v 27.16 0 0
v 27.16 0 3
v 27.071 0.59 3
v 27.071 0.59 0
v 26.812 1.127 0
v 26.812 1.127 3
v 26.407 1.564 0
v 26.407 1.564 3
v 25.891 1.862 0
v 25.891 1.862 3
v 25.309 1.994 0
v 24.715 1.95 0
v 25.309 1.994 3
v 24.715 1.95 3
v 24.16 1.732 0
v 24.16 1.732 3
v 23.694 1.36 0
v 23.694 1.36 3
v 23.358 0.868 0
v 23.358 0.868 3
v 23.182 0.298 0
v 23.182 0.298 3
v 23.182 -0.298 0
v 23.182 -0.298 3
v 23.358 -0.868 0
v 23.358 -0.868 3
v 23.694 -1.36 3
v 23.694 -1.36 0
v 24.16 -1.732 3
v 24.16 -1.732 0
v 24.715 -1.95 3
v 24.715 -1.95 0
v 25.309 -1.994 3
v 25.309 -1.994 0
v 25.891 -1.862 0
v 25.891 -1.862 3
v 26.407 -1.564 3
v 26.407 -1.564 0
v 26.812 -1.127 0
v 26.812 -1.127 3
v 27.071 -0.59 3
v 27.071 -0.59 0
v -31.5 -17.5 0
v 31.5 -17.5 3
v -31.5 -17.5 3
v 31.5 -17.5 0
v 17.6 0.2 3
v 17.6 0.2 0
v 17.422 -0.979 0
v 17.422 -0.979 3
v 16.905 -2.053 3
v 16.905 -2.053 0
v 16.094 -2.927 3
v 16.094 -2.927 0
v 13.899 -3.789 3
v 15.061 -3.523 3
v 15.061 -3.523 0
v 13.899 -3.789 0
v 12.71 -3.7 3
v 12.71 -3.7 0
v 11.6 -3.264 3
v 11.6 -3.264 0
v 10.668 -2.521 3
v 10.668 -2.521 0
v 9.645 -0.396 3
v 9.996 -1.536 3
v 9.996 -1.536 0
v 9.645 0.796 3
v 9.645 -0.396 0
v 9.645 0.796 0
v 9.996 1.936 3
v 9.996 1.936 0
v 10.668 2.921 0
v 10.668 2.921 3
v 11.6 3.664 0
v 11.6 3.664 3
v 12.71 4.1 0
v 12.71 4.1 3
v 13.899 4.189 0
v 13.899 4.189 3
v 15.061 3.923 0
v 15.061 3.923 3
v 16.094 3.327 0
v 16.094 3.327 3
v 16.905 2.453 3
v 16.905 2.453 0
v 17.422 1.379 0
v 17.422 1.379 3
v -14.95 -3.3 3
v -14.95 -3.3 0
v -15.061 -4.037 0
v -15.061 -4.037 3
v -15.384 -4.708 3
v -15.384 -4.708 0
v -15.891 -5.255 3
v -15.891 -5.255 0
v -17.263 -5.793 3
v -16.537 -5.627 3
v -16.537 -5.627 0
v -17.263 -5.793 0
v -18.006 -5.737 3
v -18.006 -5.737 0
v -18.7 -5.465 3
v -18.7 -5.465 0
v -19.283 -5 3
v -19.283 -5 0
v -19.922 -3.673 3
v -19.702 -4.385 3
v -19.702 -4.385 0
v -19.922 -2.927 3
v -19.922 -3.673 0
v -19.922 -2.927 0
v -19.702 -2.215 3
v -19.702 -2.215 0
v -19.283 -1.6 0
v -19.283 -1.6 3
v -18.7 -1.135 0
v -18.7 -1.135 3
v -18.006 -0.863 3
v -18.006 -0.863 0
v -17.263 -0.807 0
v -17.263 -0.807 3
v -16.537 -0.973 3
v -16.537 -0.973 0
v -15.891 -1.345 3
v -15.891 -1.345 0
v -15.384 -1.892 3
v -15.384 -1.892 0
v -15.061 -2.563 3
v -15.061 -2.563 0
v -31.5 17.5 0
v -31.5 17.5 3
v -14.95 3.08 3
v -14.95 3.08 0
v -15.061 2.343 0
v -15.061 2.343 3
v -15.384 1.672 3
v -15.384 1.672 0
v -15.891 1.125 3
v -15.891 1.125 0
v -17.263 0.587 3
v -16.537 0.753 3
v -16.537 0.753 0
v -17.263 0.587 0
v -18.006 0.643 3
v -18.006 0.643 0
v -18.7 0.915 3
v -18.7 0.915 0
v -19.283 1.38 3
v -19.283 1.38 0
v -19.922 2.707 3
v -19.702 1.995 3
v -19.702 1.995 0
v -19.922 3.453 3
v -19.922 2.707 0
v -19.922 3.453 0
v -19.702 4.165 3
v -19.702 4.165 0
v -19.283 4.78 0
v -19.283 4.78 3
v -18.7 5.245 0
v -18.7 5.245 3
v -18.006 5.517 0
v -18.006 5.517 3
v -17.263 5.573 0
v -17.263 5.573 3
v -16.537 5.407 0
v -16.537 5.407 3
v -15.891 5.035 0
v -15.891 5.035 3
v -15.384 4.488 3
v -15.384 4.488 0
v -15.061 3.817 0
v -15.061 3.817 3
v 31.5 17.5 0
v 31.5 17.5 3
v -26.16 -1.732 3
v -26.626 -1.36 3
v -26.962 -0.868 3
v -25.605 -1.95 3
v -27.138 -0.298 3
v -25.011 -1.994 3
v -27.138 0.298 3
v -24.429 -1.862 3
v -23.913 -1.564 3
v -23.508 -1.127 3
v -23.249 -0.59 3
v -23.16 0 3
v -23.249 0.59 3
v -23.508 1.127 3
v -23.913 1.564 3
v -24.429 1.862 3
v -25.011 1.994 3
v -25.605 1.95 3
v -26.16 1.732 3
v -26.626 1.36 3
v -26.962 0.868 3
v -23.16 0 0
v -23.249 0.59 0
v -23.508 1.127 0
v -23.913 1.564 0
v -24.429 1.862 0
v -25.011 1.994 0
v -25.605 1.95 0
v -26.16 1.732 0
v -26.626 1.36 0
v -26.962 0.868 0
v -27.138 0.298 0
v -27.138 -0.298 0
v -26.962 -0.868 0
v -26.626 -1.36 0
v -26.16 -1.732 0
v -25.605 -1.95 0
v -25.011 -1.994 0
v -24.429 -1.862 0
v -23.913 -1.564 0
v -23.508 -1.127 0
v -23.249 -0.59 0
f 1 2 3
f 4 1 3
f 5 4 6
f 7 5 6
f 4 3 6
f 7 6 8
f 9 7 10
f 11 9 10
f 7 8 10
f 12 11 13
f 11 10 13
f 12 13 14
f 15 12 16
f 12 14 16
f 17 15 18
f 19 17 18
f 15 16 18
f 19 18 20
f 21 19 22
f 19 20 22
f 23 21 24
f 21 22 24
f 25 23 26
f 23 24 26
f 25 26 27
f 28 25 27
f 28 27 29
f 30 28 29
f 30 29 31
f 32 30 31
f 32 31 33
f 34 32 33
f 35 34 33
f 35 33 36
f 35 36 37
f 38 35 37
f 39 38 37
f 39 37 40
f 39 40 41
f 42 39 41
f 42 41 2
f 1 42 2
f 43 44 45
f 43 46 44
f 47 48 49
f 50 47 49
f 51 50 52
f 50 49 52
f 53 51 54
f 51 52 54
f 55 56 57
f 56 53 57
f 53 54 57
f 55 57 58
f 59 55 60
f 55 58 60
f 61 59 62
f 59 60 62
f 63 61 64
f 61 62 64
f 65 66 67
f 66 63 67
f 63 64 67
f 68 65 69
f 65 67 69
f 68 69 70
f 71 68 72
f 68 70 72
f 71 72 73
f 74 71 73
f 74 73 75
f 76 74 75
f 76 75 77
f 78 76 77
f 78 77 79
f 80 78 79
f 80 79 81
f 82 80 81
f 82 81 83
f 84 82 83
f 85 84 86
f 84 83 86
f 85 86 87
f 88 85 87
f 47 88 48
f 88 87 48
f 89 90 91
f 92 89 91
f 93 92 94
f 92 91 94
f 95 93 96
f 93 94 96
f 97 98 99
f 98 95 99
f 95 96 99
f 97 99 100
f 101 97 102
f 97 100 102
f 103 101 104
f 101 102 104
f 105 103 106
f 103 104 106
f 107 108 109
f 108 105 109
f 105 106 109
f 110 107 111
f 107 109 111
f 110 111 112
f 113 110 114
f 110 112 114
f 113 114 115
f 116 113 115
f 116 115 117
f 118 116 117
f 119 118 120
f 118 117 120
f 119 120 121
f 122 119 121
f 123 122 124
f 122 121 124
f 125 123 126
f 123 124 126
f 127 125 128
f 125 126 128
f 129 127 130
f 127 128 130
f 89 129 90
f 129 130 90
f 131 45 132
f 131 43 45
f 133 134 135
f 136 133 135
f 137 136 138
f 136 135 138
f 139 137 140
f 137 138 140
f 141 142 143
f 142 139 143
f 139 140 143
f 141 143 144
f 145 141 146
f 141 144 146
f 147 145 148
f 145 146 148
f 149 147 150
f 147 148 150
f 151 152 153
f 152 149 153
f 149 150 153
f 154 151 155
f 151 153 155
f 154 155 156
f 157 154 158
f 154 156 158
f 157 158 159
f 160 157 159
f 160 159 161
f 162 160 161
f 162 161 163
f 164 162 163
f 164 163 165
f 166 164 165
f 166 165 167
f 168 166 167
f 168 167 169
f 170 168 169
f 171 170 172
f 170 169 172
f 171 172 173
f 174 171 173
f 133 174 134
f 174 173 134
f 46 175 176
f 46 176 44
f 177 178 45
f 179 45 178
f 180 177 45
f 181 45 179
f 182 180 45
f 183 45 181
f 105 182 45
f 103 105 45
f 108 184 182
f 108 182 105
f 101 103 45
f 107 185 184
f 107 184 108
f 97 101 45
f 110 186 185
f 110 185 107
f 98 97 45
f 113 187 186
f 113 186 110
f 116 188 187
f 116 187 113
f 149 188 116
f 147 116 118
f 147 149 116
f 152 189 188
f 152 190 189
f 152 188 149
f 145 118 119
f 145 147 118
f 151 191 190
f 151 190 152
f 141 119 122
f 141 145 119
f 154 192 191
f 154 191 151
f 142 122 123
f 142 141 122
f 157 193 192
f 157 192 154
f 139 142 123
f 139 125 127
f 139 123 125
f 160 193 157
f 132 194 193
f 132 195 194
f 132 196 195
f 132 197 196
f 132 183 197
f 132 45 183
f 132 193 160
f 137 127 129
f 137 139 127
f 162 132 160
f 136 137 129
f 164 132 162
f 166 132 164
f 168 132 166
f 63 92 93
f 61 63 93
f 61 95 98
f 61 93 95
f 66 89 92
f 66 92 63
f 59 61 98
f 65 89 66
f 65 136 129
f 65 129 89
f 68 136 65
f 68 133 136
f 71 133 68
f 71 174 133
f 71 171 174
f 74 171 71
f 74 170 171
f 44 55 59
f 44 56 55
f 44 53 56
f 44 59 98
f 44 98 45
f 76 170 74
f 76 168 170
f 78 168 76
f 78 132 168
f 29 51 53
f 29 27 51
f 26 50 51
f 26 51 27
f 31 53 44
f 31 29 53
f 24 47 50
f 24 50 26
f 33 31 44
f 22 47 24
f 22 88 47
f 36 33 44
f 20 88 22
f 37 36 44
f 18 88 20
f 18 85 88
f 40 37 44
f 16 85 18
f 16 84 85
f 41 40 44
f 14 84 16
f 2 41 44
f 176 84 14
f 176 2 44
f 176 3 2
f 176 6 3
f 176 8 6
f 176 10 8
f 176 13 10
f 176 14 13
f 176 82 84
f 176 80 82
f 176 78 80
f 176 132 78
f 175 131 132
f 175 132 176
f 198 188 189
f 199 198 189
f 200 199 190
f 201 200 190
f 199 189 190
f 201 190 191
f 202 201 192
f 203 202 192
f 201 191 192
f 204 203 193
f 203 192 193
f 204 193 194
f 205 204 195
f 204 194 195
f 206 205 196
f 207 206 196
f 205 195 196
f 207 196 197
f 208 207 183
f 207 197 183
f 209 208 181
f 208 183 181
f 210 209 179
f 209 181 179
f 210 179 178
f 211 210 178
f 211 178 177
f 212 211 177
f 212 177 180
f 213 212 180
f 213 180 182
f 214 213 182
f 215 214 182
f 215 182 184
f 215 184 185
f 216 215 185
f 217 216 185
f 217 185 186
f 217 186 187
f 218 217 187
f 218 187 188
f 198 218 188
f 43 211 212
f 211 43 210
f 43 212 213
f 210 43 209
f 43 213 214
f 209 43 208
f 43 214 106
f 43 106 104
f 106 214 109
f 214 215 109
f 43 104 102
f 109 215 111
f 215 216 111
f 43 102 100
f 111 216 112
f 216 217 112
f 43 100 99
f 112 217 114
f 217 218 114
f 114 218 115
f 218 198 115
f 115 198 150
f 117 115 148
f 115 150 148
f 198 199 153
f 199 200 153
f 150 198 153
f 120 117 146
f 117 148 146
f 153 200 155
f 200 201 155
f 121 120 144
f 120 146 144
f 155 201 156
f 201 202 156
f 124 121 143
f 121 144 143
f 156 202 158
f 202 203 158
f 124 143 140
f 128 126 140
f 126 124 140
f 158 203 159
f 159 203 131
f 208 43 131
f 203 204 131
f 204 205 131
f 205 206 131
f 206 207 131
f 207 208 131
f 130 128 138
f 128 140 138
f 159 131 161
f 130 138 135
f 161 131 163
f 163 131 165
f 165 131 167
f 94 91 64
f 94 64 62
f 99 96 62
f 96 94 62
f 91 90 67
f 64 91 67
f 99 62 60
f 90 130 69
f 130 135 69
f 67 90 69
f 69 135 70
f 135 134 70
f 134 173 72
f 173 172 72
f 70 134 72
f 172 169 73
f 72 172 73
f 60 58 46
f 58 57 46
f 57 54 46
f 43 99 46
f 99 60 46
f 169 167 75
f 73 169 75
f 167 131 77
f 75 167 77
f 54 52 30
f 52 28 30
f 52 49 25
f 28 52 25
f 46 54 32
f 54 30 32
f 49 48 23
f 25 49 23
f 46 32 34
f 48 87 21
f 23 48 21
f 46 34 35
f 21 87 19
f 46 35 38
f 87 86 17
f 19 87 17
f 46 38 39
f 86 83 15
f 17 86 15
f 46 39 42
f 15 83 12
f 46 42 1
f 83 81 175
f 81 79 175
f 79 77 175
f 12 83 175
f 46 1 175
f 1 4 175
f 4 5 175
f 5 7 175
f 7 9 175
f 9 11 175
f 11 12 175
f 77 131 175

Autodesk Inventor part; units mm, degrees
ref_plane "YZ Plane" through (0, 0, 0) normal (1, 0, 0) x (0, 1, 0)
ref_plane "XZ Plane" through (0, 0, 0) normal (0, 1, 0) x (-1, 0, 0)
ref_plane "XY Plane" through (0, 0, 0) normal (0, 0, 1) x (1, 0, 0)
sketch "Sketch1" plane through (0, 0, 0) normal (0, 0, 1) x (1, 0, 0)
  line L0 (-31.5, 17.5) -> (31.5, 17.5)
  line L1 (31.5, 17.5) -> (31.5, -17.5)
  line L2 (31.5, -17.5) -> (-31.5, -17.5)
  line L3 (-31.5, -17.5) -> (-31.5, 17.5)
  line L4 (-31.5, 17.5) -> (31.5, -17.5) construction
  line L5 (31.5, 17.5) -> (-31.5, -17.5) construction
  circle A0 centre (13.6, 0.2) radius 4
  circle A1 centre (-17.45, 3.08) radius 2.5
  circle A2 centre (-17.45, -3.3) radius 2.5
  point P0 (0, 0)
  dimension "d0" = 63
  dimension "d1" = 35
  dimension "d2" = 8
  dimension "d3" = 17.9
  dimension "d4" = 17.7
  dimension "d5" = 5
  dimension "d6" = 5
  dimension "d7" = 14.2
  dimension "d8" = 48.95
  dimension "d9" = 48.95
  dimension "d10" = 20.58
extrude "Extrusion1" add sketch "Sketch1" along normal blind 3
sketch "Sketch2" plane through (0, 0, 3) normal (0, 0, 1) x (1, 0, 0)
  circle A0 centre (25.16, 0) radius 2
  line L0 (31.5, -17.5) -> (31.5, 17.5) projected
  line L1 (-31.5, -17.5) -> (31.5, -17.5) projected
  circle A1 centre (-25.16, 0) radius 2
  line L2 (-31.5, 17.5) -> (-31.5, -17.5) projected
  point P0 (0, 0)
  dimension "d13" = 6.34
  dimension "d14" = 17.5
  dimension "d15" = 4
  dimension "d16" = 4
  dimension "d17" = 6.34
  dimension "d18" = 17.5
extrude "Extrusion2" cut sketch "Sketch2" against normal blind 3
equation "\"d9\" = d8"
equation "\"d17\" = d13"
equation "\"d18\" = d14"
properties part number "EndCapCutout"
